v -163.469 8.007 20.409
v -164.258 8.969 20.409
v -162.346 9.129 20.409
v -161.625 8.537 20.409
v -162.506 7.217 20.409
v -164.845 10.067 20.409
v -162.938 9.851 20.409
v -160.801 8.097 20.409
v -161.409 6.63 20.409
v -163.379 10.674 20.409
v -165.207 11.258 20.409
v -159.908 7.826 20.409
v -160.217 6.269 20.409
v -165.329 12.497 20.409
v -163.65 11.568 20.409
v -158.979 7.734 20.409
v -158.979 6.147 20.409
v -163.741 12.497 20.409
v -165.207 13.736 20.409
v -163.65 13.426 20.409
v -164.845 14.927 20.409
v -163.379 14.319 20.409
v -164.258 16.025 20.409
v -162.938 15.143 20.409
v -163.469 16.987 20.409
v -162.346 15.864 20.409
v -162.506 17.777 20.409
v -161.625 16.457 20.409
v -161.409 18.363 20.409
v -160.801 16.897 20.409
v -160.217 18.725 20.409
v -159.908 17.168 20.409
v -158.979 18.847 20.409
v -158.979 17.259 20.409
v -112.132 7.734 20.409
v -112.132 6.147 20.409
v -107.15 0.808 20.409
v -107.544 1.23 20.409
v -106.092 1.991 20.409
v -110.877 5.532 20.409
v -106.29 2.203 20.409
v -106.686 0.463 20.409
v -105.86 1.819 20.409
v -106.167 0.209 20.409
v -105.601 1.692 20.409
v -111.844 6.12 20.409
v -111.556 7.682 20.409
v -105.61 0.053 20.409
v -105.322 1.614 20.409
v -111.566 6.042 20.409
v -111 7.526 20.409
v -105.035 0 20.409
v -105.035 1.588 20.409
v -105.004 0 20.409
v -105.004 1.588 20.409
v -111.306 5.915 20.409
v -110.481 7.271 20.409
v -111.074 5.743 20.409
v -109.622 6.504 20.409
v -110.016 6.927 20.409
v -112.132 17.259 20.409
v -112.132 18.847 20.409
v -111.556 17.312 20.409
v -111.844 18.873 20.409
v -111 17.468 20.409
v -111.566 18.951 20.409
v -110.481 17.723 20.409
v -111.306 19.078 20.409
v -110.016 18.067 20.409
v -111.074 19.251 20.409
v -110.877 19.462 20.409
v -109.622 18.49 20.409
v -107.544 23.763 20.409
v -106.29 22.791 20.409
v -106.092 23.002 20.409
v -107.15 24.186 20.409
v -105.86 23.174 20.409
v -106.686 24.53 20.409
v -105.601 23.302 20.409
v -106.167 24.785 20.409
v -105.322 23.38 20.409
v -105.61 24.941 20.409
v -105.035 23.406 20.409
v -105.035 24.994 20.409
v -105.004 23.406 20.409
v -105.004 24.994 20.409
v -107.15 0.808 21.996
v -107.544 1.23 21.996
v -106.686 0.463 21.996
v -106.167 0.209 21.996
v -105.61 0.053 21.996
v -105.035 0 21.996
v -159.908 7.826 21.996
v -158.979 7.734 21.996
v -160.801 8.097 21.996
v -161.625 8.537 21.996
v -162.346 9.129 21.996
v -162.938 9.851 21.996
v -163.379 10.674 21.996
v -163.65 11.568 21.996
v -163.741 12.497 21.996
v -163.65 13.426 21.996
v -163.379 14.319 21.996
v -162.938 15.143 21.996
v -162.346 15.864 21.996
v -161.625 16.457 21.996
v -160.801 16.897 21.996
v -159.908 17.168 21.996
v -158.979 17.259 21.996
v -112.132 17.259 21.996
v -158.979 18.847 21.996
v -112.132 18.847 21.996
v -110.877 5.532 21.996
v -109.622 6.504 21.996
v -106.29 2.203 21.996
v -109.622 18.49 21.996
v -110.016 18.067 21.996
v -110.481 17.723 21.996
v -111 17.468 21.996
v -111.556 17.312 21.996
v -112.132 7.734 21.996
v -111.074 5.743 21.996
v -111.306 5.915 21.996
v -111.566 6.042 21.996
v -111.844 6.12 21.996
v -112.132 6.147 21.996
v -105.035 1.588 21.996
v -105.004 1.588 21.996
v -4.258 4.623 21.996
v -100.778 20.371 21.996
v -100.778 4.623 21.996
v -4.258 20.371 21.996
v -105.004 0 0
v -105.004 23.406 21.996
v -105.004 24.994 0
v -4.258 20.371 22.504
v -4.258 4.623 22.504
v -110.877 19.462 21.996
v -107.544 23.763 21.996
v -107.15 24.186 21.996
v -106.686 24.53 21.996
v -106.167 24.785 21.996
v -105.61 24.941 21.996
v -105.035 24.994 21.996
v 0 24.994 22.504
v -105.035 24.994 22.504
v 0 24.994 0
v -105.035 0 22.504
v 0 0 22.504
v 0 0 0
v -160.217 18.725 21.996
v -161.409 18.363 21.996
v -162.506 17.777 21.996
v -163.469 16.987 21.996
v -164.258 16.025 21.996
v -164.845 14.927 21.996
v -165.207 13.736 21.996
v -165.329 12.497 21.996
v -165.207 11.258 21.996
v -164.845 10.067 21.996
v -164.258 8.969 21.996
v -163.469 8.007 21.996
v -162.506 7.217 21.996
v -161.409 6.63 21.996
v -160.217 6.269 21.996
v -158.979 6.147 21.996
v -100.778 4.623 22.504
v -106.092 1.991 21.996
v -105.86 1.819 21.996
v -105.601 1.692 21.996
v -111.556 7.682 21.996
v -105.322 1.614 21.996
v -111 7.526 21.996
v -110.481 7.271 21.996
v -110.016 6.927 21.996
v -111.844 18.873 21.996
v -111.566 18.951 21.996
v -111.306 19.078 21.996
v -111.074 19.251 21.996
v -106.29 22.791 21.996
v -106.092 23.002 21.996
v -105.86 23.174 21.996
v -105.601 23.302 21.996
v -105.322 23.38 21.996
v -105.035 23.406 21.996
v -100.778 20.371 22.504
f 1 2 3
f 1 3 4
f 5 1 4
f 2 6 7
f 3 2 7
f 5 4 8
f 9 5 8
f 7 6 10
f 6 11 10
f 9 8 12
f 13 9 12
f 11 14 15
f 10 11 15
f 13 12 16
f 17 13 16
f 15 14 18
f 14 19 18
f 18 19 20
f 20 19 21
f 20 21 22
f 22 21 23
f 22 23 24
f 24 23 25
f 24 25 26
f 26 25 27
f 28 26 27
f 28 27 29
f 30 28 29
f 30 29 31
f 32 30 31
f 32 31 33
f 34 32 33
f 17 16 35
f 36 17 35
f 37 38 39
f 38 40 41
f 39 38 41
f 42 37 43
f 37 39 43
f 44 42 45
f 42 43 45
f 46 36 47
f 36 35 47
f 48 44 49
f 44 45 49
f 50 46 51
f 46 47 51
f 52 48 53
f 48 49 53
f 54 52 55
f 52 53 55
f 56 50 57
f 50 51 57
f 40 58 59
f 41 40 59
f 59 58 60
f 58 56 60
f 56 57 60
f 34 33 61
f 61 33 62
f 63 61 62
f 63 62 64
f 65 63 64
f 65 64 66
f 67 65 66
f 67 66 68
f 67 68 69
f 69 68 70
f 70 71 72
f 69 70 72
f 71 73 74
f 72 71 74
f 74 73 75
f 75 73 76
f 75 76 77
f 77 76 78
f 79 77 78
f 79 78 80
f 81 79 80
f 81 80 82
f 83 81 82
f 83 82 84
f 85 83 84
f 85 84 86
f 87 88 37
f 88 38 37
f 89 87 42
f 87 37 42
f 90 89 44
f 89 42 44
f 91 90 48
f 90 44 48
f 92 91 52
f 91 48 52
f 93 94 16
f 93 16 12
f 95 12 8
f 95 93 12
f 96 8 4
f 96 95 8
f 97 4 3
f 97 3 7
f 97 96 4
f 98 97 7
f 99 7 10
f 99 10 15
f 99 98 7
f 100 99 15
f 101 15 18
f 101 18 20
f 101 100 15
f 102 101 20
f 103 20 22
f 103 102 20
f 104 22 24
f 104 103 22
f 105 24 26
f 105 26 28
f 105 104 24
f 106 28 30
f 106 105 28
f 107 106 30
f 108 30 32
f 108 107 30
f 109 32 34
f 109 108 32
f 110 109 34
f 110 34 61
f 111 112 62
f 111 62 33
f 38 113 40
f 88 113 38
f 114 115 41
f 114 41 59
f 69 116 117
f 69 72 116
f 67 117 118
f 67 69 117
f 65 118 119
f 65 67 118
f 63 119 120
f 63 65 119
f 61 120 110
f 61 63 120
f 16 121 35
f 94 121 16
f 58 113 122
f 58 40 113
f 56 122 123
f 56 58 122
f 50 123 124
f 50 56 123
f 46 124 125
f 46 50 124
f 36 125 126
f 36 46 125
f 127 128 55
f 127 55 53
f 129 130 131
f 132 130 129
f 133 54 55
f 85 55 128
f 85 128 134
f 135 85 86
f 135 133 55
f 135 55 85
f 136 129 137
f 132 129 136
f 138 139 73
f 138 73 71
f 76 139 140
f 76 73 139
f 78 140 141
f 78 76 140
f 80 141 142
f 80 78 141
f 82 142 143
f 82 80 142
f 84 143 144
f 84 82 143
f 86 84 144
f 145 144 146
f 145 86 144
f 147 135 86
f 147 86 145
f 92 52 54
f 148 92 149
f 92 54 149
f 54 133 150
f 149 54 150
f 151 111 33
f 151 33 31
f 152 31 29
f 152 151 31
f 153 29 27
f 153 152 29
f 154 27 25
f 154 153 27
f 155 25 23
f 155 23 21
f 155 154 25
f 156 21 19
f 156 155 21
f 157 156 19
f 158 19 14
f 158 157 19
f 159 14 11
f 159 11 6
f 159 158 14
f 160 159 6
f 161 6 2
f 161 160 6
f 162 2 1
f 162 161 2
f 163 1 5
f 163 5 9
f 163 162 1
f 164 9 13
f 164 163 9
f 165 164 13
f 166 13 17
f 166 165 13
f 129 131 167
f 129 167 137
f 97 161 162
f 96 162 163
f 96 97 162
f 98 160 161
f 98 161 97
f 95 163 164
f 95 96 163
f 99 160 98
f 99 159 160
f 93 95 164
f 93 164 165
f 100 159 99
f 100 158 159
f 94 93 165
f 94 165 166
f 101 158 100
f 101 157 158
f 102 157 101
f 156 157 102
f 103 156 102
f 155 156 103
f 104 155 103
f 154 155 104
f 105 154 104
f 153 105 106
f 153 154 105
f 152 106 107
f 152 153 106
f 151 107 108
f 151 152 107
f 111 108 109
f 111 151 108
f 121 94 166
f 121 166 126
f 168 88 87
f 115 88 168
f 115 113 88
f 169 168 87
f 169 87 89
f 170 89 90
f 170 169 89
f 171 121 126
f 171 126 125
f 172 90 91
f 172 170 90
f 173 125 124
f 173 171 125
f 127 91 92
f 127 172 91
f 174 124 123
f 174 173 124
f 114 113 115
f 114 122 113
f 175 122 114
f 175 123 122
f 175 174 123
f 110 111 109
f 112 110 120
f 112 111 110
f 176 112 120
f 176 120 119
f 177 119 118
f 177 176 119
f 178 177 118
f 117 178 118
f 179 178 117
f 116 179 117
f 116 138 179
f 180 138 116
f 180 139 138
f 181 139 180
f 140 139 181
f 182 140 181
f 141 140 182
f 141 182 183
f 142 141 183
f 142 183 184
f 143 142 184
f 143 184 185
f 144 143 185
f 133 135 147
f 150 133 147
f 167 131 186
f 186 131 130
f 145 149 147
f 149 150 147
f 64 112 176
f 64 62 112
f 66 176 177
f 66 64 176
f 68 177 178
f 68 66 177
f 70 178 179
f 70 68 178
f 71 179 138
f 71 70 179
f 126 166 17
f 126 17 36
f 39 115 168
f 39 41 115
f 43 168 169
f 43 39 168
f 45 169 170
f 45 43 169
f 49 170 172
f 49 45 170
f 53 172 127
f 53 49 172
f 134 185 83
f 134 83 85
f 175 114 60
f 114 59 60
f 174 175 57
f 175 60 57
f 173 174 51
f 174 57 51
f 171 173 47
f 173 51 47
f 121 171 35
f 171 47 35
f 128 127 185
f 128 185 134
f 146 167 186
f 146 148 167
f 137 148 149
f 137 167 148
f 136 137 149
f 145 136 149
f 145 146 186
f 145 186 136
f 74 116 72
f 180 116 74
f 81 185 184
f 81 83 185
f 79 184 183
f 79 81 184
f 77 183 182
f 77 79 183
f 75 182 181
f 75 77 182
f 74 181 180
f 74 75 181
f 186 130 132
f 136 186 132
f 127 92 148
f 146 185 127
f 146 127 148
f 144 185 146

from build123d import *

# Parameters (mm, degrees)
F0_W     = 105.0036
F0_H     = 24.9936
F1_DEPTH = 21.9964
F3_DEPTH = 1.5875
F4_R     = 1.5875
F5_R     = 3.175
F6_W     = 105.034594
F6_H     = 24.9936
F6_W_2   = 96.52
F6_H_2   = 15.748
F7_DEPTH = 0.508


with BuildPart() as f1:
    # F0 (on Top) → F1 (new body)
    with BuildSketch(Plane.XY):
        with Locations((-52.5018, 12.4968)):
            Rectangle(F0_W, F0_H)
    extrude(amount=F1_DEPTH)

    # F2 (on face) → F3 (join)
    with BuildSketch(Plane.XY.offset(21.9964)):
        with BuildLine():
            Line((-111.3536, 18.8468), (-158.9786, 18.8468))
            ThreePointArc((-158.9786, 18.8468), (-165.3286, 12.4968), (-158.9786, 6.1468))
            Line((-158.9786, 6.1468), (-111.3536, 6.1468))
            Line((-111.3536, 6.1468), (-106.5911, 0))
            Line((-106.5911, 0), (-105.0036, 0))
            Line((-105.0036, 0), (-105.0036, 1.5875))
            Line((-105.0036, 1.5875), (-105.812847, 1.5875))
            Line((-105.812847, 1.5875), (-110.575347, 7.7343))
            Line((-110.575347, 7.7343), (-158.978601, 7.7343))
            ThreePointArc((-158.978601, 7.7343), (-163.7411, 12.4968), (-158.9786, 17.2593))
            Line((-158.9786, 17.2593), (-110.575347, 17.2593))
            Line((-110.575347, 17.2593), (-105.812847, 23.4061))
            Line((-105.812847, 23.4061), (-105.0036, 23.4061))
            Line((-105.0036, 23.4061), (-105.0036, 24.9936))
            Line((-105.0036, 24.9936), (-106.5911, 24.9936))
            Line((-106.5911, 24.9936), (-111.3536, 18.8468))
        make_face()
    extrude(amount=-F3_DEPTH)

    # F4
    f4_edges = [f1.edges().sort_by_distance(p)[0] for p in [
        (-111.3536, 18.8468, 21.20265),
        (-105.812847, 23.4061, 21.20265),
        (-111.3536, 6.1468, 21.20265),
        (-105.812847, 1.5875, 21.20265),
    ]]
    fillet(f4_edges, radius=F4_R)

    # F5
    f5_edges = [f1.edges().sort_by_distance(p)[0] for p in [
        (-110.575347, 7.7343, 21.20265),
        (-106.5911, 24.9936, 21.20265),
        (-110.575347, 17.2593, 21.20265),
        (-106.5911, 0, 21.20265),
    ]]
    fillet(f5_edges, radius=F5_R)

    # F6 (on face) → F7 (join)
    with BuildSketch(Plane.XY.offset(21.9964)):
        with Locations((-52.517297, 12.4968)):
            Rectangle(F6_W, F6_H)
        with Locations((-52.517554, 12.4968)):
            Rectangle(F6_W_2, F6_H_2, mode=Mode.SUBTRACT)
    extrude(amount=F7_DEPTH)


solid = f1.part
